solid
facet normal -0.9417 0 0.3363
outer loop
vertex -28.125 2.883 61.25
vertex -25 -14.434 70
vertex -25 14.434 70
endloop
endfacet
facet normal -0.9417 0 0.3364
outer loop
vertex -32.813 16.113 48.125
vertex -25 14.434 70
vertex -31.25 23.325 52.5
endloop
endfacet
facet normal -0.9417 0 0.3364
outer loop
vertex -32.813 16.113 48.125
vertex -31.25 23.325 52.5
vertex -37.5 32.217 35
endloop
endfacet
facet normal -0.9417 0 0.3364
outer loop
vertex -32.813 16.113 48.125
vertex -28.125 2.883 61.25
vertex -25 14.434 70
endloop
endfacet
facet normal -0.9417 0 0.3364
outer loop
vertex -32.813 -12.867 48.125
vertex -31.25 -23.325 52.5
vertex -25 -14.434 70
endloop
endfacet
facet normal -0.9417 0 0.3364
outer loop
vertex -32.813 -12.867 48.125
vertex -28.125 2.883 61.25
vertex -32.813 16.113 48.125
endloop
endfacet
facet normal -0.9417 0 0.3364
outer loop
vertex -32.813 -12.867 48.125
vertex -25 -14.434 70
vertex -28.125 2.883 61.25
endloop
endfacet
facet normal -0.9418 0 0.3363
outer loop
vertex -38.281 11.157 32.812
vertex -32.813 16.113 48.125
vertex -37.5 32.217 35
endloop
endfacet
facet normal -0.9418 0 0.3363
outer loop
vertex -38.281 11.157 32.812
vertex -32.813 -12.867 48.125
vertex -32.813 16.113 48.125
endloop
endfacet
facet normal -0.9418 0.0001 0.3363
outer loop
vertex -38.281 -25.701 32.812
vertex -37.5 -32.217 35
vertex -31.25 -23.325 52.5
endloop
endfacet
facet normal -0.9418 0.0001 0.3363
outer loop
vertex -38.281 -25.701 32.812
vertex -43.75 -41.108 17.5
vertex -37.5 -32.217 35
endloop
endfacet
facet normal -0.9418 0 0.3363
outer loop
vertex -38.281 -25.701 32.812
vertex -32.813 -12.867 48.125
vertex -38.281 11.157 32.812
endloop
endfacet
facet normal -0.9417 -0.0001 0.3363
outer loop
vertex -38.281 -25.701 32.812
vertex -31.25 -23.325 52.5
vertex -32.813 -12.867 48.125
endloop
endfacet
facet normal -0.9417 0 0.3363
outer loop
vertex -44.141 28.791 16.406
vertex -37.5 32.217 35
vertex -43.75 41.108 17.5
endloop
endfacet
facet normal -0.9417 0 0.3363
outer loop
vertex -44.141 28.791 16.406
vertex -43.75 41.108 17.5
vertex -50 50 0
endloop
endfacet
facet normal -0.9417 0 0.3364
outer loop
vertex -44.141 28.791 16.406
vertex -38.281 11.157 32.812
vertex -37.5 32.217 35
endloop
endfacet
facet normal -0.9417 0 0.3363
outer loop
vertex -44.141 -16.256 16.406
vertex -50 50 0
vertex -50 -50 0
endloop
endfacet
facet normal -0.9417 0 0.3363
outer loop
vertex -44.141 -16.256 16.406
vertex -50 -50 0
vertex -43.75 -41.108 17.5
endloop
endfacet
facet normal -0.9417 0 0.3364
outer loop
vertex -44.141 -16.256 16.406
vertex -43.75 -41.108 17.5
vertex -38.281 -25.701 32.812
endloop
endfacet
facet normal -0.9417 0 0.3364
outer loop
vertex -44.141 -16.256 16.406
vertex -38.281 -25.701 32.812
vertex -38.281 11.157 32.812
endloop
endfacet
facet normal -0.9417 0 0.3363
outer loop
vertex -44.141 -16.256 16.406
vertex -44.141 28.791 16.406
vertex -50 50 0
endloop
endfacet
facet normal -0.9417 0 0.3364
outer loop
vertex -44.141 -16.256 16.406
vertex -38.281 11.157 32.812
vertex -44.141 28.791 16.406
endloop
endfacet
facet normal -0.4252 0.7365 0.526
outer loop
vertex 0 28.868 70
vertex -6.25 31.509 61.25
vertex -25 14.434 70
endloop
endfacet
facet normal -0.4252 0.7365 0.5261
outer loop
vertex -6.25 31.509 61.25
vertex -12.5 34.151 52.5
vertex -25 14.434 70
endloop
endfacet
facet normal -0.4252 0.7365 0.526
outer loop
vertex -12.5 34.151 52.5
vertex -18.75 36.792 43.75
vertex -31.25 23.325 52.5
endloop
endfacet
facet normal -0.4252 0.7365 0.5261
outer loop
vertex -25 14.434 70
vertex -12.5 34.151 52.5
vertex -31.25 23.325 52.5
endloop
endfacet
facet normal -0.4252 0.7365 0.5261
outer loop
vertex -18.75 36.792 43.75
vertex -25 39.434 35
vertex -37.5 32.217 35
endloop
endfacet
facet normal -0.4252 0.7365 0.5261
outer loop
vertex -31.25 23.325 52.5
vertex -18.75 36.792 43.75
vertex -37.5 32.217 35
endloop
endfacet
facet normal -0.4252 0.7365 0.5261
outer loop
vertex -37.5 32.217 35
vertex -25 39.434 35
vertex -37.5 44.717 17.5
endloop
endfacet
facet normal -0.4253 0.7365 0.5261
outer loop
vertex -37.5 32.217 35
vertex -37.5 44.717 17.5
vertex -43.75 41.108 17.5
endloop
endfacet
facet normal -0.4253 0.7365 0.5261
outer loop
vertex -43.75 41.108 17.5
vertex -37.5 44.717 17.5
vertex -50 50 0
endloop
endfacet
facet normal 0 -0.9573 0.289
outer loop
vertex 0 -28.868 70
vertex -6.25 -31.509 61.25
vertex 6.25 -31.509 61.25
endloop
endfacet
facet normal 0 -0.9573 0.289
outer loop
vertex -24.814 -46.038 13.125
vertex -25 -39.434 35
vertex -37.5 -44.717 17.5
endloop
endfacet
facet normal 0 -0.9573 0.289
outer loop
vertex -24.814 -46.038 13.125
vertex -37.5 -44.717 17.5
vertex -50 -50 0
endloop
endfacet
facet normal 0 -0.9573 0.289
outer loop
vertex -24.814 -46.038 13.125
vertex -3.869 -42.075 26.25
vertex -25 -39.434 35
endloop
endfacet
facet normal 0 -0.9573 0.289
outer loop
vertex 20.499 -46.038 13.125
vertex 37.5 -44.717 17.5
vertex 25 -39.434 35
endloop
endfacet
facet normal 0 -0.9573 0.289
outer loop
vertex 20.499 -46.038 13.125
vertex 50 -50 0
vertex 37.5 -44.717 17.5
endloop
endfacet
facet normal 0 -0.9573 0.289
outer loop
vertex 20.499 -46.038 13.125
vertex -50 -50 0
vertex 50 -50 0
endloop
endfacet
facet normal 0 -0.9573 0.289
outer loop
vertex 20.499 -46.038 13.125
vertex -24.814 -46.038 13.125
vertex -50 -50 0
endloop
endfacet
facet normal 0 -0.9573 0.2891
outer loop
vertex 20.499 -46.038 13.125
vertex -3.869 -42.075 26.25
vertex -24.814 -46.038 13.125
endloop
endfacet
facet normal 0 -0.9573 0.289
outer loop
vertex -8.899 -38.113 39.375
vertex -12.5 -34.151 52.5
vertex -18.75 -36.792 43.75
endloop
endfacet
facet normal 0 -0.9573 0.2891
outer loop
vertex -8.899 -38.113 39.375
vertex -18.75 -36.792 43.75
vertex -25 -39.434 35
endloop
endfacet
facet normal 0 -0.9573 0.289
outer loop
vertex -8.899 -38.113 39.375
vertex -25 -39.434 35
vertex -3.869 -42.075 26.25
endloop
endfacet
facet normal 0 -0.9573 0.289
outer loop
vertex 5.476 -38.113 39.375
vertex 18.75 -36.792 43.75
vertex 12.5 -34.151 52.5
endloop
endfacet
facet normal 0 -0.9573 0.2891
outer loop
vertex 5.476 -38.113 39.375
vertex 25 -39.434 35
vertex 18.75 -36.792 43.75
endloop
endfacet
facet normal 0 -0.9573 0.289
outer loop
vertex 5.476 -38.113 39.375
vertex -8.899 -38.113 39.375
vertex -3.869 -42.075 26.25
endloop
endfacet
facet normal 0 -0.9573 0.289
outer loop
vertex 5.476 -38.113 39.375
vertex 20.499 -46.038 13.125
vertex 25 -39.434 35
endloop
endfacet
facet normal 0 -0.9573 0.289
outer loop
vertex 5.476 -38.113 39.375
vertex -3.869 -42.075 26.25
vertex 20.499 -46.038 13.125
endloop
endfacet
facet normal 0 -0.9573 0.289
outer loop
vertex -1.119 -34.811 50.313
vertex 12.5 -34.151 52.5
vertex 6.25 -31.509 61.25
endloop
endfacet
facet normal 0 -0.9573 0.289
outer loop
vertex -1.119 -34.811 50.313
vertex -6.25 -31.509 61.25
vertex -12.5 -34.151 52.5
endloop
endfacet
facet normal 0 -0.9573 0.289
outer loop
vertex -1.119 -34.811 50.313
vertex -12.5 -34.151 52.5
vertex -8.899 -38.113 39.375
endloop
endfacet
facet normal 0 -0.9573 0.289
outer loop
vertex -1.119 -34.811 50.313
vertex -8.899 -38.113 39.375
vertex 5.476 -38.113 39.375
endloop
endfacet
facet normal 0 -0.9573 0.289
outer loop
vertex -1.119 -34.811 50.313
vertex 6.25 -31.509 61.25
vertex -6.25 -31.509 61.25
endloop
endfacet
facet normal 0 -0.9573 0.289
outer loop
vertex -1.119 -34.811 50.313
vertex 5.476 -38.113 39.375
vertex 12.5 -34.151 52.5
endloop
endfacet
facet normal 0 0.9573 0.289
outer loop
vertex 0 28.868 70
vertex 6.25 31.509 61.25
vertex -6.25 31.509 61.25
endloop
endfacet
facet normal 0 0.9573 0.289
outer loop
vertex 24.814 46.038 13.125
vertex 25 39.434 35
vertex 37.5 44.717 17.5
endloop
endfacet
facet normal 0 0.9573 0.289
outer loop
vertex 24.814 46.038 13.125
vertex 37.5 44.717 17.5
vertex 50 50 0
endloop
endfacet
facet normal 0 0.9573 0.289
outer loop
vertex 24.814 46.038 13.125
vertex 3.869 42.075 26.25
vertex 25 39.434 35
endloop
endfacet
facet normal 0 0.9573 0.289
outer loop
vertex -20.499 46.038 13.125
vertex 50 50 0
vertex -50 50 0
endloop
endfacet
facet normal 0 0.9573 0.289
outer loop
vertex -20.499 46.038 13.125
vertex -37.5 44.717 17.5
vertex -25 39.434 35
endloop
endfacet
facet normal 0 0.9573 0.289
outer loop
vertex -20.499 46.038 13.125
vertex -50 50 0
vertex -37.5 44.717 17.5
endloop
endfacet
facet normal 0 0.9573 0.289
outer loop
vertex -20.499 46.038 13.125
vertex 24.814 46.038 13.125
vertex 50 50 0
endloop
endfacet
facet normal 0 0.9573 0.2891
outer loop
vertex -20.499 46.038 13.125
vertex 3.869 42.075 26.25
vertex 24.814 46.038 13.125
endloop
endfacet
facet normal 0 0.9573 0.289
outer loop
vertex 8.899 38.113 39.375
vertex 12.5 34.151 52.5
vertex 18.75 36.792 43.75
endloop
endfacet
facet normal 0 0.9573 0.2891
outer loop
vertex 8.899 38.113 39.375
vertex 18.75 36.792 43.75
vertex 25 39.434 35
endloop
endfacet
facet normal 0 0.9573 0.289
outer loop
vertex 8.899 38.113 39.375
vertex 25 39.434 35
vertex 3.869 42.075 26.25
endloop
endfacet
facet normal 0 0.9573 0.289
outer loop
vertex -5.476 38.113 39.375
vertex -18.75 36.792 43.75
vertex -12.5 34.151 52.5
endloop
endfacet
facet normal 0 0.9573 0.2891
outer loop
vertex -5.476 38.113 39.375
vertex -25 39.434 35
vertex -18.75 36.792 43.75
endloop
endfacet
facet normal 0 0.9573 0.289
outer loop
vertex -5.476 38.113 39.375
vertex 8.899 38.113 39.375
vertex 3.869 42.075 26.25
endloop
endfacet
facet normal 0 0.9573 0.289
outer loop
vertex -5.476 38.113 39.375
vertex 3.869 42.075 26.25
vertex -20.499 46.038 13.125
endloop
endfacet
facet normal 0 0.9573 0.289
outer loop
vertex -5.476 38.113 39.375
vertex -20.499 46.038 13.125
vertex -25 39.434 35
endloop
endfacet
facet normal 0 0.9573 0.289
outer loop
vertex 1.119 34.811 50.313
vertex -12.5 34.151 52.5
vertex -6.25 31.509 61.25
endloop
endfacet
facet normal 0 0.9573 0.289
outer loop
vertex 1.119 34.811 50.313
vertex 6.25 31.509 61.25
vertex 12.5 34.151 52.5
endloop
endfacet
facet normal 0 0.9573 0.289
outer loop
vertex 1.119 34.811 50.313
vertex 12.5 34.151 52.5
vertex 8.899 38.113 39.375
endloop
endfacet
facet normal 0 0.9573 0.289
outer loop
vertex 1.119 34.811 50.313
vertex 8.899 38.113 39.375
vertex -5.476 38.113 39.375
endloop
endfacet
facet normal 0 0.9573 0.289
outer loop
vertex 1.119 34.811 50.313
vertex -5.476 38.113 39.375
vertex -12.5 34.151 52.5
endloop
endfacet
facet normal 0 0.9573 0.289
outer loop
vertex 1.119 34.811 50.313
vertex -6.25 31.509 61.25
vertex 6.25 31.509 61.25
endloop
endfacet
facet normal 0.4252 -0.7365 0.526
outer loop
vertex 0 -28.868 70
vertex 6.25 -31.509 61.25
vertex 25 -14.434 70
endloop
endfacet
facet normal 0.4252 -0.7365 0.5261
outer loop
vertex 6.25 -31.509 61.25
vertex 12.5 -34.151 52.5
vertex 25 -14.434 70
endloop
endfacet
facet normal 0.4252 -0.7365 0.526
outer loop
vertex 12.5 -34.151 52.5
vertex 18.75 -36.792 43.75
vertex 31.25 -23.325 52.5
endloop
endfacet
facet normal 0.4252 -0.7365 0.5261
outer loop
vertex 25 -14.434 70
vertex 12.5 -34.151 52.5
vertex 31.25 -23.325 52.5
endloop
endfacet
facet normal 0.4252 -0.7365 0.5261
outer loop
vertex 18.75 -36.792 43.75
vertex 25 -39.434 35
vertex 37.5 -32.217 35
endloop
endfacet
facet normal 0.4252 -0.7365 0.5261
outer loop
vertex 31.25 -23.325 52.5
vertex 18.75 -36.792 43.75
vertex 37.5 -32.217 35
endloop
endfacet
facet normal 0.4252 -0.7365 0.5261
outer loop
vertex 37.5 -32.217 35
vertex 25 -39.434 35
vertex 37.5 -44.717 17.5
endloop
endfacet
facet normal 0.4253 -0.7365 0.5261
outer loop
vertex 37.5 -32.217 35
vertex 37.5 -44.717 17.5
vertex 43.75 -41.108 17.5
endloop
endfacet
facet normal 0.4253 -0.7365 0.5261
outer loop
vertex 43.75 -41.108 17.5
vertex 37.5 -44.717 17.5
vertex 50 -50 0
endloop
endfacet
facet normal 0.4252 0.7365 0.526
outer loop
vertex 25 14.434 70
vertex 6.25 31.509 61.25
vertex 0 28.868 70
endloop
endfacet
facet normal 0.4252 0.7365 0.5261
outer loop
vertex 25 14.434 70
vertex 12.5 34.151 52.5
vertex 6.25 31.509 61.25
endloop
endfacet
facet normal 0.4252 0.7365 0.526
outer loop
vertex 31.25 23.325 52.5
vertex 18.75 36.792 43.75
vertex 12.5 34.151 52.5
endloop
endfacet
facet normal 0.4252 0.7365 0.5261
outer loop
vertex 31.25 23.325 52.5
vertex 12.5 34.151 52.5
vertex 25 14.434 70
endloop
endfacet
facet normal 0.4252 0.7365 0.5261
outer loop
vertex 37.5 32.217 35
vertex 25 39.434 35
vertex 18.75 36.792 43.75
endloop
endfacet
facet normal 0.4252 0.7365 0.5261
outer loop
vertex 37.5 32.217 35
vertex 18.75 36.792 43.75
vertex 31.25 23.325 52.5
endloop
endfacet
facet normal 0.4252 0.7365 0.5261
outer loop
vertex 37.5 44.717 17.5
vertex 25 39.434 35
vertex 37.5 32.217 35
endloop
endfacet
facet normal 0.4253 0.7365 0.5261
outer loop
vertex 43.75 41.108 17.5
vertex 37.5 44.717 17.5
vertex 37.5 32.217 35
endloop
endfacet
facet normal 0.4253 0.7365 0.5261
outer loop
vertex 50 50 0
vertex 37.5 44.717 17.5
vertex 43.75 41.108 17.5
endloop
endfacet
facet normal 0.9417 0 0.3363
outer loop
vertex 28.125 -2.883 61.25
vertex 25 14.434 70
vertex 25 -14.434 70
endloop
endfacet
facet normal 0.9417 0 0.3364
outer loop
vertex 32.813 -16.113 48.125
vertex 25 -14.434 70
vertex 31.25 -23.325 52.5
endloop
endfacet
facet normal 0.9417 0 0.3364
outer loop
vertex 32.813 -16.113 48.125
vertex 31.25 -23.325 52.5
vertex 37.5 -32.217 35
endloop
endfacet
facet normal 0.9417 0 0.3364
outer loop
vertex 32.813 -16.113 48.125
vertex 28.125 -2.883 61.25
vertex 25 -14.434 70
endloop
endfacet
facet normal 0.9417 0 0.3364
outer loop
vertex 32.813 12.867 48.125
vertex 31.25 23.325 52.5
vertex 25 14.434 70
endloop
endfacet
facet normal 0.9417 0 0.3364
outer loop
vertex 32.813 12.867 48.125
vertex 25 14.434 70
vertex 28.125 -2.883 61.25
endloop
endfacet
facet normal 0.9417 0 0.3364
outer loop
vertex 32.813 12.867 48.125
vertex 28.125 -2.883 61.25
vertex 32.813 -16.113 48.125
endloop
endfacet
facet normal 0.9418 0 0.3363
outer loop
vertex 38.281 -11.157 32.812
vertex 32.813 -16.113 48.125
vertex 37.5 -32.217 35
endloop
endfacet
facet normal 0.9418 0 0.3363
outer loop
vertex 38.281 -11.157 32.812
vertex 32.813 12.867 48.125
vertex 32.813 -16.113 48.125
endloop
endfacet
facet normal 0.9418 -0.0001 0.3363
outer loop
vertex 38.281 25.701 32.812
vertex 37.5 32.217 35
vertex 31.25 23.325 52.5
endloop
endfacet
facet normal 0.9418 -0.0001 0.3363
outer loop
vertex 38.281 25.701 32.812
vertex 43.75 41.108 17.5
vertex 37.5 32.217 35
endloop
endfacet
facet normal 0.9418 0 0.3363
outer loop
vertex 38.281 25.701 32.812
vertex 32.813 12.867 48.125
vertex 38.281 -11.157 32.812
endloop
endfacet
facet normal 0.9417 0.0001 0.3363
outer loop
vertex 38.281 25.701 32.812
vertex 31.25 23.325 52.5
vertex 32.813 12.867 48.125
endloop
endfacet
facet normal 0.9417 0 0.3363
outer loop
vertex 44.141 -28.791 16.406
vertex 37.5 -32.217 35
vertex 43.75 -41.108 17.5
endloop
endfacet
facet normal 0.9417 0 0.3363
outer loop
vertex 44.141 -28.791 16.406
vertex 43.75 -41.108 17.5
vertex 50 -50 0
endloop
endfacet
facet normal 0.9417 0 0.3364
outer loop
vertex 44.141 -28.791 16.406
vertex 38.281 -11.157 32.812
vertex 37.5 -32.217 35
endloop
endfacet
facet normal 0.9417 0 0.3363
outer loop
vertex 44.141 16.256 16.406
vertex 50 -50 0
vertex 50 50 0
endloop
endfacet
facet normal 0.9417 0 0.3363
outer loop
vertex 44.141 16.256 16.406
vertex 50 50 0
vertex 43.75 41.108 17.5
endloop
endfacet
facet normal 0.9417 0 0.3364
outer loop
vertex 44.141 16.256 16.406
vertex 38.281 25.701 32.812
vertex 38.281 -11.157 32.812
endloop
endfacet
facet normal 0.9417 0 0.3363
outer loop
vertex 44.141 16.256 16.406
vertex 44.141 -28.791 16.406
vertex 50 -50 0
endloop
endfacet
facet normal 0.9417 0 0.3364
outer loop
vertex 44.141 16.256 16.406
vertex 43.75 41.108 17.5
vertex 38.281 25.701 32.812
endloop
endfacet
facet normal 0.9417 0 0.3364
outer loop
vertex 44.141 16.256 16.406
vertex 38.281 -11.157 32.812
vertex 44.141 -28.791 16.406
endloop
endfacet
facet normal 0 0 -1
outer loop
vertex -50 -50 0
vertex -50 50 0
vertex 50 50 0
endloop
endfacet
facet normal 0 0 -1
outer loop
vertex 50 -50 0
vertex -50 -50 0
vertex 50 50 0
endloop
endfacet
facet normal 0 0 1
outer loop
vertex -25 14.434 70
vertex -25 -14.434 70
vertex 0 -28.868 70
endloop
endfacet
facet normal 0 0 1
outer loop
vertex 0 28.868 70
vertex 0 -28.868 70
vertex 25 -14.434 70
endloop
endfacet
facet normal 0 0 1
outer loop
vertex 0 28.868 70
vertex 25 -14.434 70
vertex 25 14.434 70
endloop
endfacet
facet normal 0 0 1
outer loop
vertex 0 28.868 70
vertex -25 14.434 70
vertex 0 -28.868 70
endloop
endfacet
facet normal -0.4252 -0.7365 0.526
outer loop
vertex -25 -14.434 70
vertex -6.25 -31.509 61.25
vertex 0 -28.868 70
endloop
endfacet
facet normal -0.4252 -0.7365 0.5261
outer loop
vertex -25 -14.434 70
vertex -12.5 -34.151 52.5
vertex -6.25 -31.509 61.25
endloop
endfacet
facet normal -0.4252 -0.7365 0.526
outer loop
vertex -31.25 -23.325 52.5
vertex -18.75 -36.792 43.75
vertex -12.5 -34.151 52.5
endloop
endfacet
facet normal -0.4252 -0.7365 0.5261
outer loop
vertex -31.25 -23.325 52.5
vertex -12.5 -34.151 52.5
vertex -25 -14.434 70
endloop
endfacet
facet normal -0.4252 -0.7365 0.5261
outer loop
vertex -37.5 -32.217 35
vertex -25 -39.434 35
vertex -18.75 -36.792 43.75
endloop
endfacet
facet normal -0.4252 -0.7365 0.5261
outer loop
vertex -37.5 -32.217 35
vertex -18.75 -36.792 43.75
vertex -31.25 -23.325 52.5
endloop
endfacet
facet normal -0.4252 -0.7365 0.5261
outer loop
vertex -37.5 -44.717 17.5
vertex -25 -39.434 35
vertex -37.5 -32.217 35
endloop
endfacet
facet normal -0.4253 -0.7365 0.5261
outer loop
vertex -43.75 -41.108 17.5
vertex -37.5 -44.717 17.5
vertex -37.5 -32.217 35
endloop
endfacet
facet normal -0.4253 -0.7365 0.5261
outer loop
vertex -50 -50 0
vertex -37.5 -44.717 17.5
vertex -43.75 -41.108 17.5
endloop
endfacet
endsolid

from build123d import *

# Parameters (mm, degrees)
F0_W = 100
F0_H = 100
F6_W = 50
F6_H = 57.735026


with BuildPart() as f3:
    # F2 (on offset) → F3 section 0
    with BuildSketch(Plane.XY.offset(70), mode=Mode.PRIVATE) as f3_s0:
        Polygon((-25, -28.867513), (0, -28.867513), (-25, -14.433757), align=None)
    loft([f3_s0.sketch, Vertex(-50, -50, 0)])


with BuildPart() as f4_1:
    # F4: instance of F3
    add(f3.part.mirror(Plane.XZ))


with BuildPart() as f5_1:
    # F5: instance of F4_1
    add(f4_1.part.mirror(Plane.YZ))


with BuildPart() as f5_2:
    # F5: instance of F3
    add(f3.part.mirror(Plane.YZ))


with BuildPart() as f7:
    # F0 (on Top) → F7 section 0
    with BuildSketch(Plane.XY):
        Rectangle(F0_W, F0_H)
    # F6 (on offset) → F7 section 1
    with BuildSketch(Plane.XY.offset(70)):
        Rectangle(F6_W, F6_H)
    loft()

    # F8: cut F3, F4_1, F5_2, F5_1
    add(f3.part, mode=Mode.SUBTRACT)
    add(f4_1.part, mode=Mode.SUBTRACT)
    add(f5_2.part, mode=Mode.SUBTRACT)
    add(f5_1.part, mode=Mode.SUBTRACT)


solid = f7.part
